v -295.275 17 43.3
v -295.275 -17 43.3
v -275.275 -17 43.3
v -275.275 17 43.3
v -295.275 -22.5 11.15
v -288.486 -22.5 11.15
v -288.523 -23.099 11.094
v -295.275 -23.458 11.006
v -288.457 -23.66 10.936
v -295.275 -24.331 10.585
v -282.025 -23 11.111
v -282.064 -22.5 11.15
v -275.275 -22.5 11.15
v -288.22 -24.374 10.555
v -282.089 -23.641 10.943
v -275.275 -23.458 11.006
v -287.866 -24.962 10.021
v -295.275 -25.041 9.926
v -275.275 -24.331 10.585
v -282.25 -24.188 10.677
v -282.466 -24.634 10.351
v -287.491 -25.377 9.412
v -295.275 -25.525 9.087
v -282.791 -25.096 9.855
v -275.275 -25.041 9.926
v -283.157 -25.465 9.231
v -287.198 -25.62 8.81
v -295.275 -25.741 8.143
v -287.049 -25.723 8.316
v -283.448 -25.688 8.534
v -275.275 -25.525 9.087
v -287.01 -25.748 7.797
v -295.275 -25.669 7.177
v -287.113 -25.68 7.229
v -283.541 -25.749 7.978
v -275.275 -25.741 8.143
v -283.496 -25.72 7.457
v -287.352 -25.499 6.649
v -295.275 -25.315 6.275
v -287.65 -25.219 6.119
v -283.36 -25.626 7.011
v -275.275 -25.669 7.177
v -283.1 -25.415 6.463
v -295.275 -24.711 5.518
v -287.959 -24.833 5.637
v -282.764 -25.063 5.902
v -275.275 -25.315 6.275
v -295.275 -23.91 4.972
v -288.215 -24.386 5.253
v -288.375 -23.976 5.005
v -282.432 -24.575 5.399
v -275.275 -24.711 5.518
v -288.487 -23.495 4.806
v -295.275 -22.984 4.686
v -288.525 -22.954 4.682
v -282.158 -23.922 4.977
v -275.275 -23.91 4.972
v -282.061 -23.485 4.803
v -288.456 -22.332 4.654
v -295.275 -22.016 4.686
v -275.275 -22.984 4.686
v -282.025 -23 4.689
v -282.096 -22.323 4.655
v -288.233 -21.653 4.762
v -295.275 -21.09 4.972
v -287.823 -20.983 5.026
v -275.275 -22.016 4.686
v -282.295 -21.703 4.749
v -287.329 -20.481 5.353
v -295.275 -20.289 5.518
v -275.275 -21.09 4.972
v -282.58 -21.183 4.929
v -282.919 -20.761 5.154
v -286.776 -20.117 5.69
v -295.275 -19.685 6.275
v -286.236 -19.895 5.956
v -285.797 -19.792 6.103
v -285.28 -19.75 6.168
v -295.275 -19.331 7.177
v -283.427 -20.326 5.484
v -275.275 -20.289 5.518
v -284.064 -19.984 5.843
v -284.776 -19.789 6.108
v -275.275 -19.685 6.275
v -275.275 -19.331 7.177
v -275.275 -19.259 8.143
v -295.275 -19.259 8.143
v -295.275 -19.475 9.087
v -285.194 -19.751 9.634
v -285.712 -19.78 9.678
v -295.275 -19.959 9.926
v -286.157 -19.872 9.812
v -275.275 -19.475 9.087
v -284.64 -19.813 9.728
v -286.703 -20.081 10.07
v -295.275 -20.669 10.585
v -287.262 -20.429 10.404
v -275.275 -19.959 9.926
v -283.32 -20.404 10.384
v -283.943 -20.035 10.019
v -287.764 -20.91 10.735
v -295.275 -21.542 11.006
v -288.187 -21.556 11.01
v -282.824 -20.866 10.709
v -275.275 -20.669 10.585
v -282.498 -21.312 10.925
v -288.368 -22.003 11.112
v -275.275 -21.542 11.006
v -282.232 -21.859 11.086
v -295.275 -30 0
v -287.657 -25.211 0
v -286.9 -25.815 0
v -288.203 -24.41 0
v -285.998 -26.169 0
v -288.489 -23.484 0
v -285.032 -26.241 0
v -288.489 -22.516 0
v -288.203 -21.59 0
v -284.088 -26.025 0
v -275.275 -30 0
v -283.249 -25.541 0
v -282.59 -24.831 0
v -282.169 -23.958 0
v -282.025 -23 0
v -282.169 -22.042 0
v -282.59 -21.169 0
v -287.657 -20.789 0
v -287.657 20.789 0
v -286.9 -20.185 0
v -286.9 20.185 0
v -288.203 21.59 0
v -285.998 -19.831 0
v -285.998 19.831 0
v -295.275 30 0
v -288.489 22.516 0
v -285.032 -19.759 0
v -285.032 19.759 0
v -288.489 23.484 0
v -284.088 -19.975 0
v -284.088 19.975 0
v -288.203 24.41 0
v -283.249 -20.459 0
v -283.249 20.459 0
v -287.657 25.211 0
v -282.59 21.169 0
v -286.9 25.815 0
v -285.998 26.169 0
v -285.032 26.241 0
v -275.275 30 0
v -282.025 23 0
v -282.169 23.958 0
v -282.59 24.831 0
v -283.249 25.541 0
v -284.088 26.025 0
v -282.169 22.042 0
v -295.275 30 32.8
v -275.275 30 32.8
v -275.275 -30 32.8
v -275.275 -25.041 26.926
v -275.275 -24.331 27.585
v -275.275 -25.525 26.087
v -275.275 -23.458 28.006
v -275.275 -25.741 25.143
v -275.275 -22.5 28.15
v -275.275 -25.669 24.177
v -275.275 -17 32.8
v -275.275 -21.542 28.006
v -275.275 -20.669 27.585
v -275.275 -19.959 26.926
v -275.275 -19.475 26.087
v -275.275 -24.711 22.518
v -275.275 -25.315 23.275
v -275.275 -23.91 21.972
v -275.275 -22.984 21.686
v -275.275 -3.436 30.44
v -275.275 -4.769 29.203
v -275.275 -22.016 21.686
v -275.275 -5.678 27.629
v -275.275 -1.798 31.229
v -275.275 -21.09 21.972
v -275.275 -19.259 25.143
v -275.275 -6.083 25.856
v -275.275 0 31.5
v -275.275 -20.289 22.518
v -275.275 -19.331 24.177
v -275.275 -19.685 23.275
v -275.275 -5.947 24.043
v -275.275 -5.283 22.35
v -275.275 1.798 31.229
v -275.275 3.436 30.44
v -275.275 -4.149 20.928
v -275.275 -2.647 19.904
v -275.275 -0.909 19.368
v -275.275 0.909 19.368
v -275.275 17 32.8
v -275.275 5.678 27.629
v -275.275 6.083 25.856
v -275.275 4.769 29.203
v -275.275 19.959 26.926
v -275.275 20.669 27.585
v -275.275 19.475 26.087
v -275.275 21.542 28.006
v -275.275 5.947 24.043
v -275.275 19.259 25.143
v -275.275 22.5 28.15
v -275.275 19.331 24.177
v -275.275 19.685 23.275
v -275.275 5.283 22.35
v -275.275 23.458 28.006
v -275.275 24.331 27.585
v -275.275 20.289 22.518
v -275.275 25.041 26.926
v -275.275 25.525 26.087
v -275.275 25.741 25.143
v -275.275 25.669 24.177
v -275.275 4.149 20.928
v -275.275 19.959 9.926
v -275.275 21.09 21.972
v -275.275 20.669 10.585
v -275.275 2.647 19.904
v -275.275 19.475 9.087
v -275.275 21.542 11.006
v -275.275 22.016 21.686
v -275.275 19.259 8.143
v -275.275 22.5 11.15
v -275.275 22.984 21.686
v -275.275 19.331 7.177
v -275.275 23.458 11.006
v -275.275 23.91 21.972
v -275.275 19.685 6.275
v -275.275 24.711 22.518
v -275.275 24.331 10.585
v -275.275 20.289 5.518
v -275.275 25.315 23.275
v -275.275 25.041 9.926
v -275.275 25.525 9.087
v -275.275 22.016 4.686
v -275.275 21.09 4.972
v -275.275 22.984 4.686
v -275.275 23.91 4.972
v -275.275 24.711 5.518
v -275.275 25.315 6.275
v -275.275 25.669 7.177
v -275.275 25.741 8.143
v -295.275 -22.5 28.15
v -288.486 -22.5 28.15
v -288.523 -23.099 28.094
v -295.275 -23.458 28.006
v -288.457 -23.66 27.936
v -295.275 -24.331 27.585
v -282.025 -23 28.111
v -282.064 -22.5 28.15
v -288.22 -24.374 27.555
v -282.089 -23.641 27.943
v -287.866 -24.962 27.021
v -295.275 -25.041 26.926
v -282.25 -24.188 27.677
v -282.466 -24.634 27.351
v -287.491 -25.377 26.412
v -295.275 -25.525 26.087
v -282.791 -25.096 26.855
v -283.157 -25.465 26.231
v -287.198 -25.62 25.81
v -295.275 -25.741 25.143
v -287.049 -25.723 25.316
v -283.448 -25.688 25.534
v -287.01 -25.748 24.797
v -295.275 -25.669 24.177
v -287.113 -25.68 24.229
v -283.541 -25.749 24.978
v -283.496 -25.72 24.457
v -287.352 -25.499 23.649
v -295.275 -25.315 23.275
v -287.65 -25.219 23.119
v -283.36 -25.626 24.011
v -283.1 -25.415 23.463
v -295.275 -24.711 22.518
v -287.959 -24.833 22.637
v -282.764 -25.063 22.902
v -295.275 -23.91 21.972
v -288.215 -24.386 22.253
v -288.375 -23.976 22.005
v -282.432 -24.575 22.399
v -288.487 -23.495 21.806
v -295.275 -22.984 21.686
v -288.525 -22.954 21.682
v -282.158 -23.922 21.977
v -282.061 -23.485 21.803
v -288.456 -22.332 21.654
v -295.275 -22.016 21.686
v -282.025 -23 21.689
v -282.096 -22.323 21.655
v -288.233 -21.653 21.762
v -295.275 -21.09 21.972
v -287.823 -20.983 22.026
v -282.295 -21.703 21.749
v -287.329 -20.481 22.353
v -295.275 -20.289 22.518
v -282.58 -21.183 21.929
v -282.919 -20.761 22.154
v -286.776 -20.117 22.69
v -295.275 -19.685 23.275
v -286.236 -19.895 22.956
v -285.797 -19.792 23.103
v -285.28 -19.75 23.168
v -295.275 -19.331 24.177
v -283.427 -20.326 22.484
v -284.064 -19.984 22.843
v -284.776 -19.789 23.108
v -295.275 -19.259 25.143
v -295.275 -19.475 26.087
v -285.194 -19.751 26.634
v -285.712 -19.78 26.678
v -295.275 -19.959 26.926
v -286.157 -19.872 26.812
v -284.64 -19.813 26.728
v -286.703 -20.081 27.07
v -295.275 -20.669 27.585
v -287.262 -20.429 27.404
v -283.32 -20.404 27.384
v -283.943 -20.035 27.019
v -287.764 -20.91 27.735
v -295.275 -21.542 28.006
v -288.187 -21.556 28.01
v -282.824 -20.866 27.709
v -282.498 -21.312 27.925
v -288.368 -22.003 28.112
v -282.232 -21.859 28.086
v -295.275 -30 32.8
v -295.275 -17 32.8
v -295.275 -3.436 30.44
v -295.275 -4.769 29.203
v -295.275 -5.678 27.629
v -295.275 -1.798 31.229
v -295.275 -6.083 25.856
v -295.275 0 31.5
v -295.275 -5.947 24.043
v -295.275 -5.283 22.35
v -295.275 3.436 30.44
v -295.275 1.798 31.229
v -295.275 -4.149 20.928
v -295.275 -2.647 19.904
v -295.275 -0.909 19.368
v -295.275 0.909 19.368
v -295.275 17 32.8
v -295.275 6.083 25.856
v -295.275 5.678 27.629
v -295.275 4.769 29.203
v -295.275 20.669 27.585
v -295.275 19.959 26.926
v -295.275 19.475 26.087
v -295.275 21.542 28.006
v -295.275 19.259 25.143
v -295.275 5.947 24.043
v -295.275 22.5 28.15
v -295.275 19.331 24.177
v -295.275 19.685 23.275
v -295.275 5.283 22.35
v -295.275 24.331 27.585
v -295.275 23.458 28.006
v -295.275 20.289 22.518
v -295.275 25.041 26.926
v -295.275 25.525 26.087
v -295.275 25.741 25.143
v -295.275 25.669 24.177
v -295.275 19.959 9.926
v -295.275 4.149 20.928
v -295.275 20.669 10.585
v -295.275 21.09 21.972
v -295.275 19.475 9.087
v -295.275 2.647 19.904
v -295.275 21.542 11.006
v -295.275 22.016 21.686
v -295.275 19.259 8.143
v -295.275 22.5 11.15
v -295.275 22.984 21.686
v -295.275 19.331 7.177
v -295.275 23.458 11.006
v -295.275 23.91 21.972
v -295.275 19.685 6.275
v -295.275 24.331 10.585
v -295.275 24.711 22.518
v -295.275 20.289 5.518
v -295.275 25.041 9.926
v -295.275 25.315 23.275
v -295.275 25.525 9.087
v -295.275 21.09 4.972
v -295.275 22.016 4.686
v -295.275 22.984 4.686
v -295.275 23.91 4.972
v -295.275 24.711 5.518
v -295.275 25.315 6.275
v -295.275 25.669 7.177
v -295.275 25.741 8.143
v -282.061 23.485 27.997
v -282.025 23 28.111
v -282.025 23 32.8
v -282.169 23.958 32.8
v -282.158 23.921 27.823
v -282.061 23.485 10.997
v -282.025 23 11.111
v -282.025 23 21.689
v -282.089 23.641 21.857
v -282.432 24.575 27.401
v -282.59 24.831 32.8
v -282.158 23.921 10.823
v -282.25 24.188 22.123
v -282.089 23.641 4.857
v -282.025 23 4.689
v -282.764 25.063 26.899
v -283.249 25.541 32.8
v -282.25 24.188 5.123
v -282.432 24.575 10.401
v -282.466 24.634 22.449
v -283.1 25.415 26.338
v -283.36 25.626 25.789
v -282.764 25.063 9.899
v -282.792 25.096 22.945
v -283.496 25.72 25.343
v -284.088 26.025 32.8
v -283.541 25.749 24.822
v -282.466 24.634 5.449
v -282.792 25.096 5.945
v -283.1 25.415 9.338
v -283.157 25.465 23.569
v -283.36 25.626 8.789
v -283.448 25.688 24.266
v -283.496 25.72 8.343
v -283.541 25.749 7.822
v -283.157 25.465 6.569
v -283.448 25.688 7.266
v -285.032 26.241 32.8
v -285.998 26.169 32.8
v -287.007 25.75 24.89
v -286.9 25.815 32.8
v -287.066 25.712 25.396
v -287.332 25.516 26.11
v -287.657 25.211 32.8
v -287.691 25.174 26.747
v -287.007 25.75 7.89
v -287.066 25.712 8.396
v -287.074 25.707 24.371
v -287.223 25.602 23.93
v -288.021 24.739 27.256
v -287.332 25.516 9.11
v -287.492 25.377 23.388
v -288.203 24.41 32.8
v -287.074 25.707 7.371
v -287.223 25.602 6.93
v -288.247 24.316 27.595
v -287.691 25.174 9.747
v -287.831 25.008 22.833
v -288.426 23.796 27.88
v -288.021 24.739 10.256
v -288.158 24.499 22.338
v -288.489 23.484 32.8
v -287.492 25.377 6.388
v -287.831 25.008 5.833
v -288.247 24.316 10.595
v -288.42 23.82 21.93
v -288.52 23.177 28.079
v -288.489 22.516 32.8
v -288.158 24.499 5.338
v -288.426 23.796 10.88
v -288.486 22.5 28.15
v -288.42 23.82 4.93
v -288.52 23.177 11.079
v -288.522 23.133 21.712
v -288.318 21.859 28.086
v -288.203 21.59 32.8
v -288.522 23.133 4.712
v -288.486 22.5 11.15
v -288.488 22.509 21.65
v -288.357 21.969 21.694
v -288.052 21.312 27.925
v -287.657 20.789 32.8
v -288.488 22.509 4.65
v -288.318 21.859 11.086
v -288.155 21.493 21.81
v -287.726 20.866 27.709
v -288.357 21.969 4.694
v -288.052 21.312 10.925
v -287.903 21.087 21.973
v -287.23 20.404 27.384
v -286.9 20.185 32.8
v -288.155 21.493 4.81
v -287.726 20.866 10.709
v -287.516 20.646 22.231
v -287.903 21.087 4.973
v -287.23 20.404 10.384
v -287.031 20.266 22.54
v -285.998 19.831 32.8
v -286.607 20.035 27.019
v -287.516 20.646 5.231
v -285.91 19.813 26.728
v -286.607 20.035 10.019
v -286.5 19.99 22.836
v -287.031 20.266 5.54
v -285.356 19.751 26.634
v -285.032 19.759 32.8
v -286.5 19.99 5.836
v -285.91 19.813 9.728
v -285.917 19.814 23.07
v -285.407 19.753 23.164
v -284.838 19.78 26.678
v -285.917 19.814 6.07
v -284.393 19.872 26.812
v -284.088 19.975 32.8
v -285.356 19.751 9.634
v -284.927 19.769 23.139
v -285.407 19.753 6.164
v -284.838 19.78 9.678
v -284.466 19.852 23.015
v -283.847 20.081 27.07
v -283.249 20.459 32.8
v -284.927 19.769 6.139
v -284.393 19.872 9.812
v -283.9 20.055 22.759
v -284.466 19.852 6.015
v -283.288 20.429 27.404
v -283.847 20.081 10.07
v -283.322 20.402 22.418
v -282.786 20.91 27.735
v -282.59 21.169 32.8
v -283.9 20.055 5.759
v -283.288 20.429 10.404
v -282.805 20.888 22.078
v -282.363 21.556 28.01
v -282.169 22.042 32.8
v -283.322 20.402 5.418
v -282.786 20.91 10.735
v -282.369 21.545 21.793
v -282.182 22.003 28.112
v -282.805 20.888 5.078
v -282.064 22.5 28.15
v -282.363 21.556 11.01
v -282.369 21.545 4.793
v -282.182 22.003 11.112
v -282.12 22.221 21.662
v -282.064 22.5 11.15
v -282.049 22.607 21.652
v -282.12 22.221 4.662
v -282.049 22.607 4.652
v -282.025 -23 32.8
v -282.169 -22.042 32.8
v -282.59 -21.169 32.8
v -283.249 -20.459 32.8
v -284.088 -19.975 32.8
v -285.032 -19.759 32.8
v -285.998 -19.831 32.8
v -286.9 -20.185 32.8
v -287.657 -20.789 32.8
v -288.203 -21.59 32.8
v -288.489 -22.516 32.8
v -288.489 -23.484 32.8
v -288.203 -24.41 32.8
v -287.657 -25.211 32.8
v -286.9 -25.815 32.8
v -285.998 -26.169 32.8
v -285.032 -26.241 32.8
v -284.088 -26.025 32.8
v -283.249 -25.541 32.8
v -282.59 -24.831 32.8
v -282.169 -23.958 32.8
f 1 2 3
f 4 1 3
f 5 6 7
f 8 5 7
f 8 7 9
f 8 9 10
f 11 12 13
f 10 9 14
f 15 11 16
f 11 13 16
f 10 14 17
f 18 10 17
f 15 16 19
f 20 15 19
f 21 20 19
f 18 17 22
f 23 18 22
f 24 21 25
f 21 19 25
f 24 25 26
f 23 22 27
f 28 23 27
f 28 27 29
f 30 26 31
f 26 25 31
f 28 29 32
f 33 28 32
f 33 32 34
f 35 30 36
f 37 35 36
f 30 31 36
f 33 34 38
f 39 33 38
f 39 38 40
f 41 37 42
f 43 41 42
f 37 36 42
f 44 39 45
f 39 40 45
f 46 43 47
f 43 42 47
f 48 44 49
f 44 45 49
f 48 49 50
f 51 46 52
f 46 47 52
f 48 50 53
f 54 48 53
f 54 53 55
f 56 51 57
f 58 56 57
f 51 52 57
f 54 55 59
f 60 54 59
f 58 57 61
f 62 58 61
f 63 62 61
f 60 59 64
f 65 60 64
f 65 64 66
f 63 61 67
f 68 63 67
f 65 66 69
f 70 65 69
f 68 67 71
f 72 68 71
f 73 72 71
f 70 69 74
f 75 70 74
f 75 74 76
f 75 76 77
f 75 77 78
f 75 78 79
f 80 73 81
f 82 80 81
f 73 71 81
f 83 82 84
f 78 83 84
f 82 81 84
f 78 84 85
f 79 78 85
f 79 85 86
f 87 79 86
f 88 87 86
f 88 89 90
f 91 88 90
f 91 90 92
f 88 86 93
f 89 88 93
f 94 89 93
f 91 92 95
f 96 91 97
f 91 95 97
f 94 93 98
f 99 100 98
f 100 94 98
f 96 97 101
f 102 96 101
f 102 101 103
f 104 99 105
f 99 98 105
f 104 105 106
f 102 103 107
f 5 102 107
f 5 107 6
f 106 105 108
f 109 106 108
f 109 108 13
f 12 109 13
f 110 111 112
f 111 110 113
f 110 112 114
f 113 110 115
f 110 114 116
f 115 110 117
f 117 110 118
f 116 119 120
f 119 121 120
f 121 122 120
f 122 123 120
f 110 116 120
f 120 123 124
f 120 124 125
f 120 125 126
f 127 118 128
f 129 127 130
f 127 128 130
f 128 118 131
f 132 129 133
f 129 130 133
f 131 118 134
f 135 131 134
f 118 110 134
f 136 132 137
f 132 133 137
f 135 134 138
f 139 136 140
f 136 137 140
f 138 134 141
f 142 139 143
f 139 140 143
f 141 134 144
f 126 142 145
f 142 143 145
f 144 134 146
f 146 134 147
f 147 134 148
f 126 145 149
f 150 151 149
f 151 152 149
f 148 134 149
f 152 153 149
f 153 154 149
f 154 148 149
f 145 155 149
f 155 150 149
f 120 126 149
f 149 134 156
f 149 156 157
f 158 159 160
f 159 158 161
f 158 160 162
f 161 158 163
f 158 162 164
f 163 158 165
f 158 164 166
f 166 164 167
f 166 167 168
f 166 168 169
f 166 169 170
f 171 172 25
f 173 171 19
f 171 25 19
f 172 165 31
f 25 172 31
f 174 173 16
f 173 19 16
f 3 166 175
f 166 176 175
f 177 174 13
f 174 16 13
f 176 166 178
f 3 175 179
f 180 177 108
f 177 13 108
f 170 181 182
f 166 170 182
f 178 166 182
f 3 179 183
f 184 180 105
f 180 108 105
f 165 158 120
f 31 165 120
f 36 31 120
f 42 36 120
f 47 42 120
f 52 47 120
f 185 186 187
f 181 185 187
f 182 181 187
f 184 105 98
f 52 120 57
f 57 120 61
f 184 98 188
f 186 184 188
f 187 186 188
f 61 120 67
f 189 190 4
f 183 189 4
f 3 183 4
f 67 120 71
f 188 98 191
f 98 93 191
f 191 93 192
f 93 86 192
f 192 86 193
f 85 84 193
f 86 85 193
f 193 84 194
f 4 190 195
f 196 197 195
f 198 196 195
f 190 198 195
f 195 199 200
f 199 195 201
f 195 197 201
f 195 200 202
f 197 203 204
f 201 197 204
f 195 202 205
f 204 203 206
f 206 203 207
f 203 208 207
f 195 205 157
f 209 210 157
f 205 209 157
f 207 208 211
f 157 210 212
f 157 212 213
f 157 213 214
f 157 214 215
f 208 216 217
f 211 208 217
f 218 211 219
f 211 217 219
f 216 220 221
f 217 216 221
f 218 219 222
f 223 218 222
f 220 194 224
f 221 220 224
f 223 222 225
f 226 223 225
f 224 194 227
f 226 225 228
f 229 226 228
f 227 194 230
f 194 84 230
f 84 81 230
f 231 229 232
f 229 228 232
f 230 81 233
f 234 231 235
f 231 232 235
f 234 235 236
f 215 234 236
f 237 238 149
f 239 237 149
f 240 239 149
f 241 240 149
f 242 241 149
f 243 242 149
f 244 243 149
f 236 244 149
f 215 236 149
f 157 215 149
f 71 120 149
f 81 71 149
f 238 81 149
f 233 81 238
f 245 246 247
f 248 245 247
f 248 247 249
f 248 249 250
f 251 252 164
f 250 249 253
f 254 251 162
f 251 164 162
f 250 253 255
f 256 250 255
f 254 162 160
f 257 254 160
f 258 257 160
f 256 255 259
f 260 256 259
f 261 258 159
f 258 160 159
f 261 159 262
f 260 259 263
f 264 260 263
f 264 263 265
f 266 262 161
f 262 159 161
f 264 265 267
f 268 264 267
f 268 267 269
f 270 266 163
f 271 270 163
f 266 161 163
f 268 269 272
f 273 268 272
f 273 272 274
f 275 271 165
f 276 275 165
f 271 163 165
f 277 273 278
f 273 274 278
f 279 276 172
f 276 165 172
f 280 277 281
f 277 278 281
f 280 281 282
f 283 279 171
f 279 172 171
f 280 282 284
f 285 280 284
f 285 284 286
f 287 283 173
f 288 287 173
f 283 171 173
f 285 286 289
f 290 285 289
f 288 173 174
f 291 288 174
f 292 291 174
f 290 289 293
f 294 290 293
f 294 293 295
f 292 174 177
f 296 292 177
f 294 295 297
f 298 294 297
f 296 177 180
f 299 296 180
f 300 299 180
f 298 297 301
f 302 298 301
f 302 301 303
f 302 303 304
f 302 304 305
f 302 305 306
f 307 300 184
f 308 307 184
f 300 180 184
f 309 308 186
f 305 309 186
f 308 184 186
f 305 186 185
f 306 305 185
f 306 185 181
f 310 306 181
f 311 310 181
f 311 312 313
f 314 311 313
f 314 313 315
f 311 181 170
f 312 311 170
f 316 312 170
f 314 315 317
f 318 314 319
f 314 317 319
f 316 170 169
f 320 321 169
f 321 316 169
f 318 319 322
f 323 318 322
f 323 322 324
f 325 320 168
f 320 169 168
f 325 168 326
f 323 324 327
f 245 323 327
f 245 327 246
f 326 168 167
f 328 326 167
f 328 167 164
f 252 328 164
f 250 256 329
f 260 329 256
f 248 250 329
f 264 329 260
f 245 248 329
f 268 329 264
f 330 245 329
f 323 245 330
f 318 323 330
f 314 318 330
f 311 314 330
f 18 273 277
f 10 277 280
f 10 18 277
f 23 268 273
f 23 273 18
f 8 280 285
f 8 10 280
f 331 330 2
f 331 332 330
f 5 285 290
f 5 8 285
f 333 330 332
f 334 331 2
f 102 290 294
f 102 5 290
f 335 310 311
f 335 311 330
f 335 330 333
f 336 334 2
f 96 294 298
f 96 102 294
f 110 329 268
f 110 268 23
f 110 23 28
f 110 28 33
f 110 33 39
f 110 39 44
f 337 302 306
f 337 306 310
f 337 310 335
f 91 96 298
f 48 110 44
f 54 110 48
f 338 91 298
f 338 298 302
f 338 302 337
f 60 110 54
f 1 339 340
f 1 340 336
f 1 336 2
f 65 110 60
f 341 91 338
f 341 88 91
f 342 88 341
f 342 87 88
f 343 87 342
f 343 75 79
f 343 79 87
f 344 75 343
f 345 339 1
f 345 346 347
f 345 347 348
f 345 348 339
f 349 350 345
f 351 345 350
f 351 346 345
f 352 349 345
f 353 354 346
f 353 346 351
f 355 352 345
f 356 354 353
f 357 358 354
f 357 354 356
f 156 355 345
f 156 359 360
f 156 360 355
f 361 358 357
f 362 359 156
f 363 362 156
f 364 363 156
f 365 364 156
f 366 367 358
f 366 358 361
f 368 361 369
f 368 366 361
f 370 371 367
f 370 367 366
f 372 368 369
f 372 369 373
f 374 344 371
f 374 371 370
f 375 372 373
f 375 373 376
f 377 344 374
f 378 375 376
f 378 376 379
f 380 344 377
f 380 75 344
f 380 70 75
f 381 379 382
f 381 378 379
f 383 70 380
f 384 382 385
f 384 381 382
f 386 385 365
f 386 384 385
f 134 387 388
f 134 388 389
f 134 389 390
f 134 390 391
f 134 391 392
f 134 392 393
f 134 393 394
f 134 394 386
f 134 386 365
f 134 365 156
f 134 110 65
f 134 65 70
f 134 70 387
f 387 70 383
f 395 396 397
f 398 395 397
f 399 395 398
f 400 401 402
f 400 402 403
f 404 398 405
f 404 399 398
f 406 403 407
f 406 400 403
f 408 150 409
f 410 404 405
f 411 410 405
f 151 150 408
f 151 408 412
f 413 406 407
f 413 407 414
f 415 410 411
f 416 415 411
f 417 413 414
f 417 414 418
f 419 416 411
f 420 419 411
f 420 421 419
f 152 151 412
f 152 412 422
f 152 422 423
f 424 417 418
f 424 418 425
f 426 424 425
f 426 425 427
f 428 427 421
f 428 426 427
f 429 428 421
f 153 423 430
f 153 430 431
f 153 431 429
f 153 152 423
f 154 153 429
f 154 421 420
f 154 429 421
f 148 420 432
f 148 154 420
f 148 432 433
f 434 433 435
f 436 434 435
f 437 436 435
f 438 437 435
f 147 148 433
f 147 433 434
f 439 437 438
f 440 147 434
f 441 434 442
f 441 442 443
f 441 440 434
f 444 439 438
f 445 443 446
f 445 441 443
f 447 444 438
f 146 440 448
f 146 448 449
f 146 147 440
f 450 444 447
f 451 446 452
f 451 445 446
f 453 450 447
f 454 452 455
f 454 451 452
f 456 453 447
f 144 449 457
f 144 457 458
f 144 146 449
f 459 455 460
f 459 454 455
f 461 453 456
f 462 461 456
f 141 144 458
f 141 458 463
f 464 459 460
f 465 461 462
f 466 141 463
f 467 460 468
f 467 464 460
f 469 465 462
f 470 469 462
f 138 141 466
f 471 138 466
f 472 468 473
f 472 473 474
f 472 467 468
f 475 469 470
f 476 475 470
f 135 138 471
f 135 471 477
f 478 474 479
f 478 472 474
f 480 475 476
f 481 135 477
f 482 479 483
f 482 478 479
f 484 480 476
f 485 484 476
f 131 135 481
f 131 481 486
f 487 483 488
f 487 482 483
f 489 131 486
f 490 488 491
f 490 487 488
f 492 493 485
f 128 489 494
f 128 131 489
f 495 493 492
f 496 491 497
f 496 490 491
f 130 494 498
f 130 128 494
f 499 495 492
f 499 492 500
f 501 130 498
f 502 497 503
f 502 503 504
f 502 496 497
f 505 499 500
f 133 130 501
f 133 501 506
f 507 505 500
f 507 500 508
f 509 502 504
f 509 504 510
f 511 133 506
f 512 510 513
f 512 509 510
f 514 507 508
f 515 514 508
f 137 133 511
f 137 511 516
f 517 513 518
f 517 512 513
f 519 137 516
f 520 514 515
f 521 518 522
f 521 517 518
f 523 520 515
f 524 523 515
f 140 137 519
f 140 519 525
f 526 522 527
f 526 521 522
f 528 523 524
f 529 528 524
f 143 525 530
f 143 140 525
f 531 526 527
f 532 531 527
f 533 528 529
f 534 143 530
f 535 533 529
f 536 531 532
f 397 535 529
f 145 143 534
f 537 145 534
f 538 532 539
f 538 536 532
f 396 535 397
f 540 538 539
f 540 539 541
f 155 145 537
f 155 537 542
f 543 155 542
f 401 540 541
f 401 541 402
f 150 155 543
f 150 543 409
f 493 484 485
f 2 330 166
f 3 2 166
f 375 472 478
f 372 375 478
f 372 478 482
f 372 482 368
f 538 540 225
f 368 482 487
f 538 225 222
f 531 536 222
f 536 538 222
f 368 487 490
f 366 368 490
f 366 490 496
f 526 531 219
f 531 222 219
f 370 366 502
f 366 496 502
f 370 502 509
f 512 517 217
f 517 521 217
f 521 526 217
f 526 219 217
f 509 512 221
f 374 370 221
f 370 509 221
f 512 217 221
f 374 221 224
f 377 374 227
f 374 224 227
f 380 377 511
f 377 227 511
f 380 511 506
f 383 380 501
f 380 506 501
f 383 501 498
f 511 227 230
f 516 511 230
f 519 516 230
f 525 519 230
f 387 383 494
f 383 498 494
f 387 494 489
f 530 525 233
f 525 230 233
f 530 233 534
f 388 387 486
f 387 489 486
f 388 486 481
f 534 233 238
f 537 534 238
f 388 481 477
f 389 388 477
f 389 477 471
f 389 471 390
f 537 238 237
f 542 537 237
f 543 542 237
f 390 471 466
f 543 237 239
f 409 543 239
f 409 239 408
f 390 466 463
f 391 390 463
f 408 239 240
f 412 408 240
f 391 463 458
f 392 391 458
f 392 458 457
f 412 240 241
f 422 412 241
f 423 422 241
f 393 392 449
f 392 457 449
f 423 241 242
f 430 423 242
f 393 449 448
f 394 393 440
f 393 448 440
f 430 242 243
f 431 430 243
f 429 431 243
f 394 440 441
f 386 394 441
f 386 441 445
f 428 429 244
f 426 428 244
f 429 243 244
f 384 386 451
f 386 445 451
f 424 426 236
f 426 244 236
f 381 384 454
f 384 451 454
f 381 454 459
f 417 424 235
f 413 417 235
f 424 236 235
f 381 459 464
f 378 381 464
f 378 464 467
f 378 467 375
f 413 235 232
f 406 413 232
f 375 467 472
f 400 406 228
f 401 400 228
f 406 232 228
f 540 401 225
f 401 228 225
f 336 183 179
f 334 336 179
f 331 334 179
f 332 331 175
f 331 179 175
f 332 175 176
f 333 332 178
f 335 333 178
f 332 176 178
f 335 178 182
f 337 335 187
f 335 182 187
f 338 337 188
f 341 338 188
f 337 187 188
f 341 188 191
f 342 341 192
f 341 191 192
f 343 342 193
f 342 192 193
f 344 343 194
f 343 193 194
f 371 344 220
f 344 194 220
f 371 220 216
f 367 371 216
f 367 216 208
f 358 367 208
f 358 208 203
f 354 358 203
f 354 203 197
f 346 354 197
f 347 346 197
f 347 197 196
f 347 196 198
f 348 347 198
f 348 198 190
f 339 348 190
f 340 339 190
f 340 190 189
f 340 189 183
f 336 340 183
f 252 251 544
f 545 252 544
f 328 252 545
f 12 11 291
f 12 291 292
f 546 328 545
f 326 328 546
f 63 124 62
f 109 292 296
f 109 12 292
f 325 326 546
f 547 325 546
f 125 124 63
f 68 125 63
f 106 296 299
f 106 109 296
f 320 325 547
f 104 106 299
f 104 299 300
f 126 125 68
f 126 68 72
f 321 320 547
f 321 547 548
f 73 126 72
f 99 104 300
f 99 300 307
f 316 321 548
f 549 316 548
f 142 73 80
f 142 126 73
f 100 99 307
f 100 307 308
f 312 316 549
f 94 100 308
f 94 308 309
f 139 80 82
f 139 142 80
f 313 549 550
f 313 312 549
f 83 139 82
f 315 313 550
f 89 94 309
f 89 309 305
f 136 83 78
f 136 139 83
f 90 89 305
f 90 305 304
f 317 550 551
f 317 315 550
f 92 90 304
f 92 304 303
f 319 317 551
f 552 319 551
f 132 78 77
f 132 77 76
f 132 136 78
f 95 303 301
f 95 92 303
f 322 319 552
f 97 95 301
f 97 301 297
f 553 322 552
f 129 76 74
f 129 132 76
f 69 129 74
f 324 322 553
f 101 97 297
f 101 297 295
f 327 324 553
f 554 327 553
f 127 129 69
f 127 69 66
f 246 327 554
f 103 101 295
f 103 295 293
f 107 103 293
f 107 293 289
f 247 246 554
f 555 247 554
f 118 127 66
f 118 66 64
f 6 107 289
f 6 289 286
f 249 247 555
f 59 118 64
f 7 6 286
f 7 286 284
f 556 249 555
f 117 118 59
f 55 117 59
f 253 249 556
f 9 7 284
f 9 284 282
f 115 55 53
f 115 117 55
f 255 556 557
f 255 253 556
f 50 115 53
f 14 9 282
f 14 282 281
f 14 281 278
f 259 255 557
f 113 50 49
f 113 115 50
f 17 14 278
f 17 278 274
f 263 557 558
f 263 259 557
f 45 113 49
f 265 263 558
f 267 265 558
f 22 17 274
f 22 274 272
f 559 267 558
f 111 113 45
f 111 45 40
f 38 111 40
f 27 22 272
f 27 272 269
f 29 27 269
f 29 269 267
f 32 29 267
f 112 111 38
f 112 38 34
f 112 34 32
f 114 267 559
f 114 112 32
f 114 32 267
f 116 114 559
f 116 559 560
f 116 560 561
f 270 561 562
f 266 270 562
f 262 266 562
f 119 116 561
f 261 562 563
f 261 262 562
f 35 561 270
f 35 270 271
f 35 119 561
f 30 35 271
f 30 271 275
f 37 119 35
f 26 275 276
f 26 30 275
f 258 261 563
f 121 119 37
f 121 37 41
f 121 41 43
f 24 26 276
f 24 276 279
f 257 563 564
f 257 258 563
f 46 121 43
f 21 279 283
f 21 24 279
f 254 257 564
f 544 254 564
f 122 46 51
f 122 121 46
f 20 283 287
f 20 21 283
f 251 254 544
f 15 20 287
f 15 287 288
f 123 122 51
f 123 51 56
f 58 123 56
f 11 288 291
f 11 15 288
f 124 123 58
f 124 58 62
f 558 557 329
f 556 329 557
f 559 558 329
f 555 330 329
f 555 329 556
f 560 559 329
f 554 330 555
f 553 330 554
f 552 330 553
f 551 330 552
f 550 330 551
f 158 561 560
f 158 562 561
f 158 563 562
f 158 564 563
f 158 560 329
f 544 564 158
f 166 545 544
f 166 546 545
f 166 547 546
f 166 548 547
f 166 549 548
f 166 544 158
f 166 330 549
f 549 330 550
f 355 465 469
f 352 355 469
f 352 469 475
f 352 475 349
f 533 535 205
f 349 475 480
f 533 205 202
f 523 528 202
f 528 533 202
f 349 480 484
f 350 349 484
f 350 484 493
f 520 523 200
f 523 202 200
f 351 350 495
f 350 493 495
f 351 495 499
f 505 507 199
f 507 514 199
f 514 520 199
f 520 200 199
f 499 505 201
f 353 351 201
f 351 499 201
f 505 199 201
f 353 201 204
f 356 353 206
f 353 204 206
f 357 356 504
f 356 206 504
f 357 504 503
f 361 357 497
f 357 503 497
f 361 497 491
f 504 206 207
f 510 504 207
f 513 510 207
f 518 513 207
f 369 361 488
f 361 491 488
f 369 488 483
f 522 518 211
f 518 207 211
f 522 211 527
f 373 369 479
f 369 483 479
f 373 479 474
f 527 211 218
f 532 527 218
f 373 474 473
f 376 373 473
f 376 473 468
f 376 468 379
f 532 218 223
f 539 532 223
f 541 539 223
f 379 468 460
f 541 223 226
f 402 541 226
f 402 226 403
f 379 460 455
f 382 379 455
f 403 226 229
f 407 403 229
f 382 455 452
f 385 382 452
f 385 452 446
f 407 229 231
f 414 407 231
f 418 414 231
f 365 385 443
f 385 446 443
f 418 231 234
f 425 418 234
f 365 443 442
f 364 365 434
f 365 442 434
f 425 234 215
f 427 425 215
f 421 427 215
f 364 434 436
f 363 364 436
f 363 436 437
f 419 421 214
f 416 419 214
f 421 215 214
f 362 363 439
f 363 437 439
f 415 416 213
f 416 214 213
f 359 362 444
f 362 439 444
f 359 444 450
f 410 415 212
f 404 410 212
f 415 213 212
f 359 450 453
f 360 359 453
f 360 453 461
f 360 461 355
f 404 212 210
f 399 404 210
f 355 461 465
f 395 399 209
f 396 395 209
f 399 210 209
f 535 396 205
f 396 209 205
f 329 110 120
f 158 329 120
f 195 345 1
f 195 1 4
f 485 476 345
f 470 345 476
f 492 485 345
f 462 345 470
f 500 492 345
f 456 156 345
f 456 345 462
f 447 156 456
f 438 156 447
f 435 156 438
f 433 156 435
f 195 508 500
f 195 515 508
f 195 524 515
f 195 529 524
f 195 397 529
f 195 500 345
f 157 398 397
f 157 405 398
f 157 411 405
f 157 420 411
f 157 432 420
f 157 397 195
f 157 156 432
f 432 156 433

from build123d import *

# Parameters (mm, degrees)
SKETCH1_W           = 20
SKETCH1_H           = 13
SKETCH1_R           = 3.25
SKETCH1_H_2         = 34
BOSS_EXTRUDE1_DEPTH = 32.8
BOSS_EXTRUDE2_START = 32.8
SKETCH1_3_W         = 20
SKETCH1_3_H         = 34
BOSS_EXTRUDE2_DEPTH = 10.5
SKETCH2_OUTSIDE_W   = 60.63
SKETCH2_OUTSIDE_H   = 77.33
SKETCH2_OUTSIDE_R   = 6.1
SKETCH2_OUTSIDE_R_2 = 3.25
CUT_EXTRUDE1_DEPTH  = 295.275


with BuildPart() as part:
    # Sketch1 → Boss-Extrude1 (new body)
    # profile 1 of 3: a face of its own
    with BuildSketch(Plane.XY):
        with Locations((-285.275, 23.5)):
            Rectangle(SKETCH1_W, SKETCH1_H)
        with Locations((-285.275, 23)):
            Circle(SKETCH1_R, mode=Mode.SUBTRACT)
    # profile 2 of 3: a face of its own
    with BuildSketch(Plane.XY):
        with Locations((-285.275, 0)):
            Rectangle(SKETCH1_W, SKETCH1_H_2)
    # profile 3 of 3: a face of its own
    with BuildSketch(Plane.XY):
        with Locations((-285.275, -23.5)):
            Rectangle(SKETCH1_W, SKETCH1_H)
        with Locations((-285.275, -23)):
            Circle(SKETCH1_R, mode=Mode.SUBTRACT)
    extrude(amount=BOSS_EXTRUDE1_DEPTH)

    # Sketch1<3> → Boss-Extrude2 (add)
    with BuildSketch(Plane.XY.offset(BOSS_EXTRUDE2_START)):
        with Locations((-285.275, 0)):
            Rectangle(SKETCH1_3_W, SKETCH1_3_H)
    extrude(amount=BOSS_EXTRUDE2_DEPTH)

    # Sketch2 outside → Cut-Extrude1 (cut)
    # profile 1 of 6: a face of its own
    with BuildSketch(Plane(origin=(0, 0, 0), x_dir=(0, 0, -1), z_dir=(1, 0, 0))):
        with Locations((-21.65, 0)):
            Rectangle(SKETCH2_OUTSIDE_W, SKETCH2_OUTSIDE_H)
        Polygon((0, -30), (0, 30), (-32.8, 30), (-32.8, 17), (-43.3, 17), (-43.3, -17), (-32.8, -17), (-32.8, -30), align=None, mode=Mode.SUBTRACT)
    # profile 2 of 6: a face of its own
    with BuildSketch(Plane(origin=(0, 0, 0), x_dir=(0, 0, -1), z_dir=(1, 0, 0))):
        with Locations(Location((-25.4, 0, 0), (0, 0, 180))):
            Circle(SKETCH2_OUTSIDE_R)
    # profile 3 of 6: a face of its own
    with BuildSketch(Plane(origin=(0, 0, 0), x_dir=(0, 0, -1), z_dir=(1, 0, 0))):
        with Locations(Location((-7.9, -22.5, 0), (0, 0, 180))):
            Circle(SKETCH2_OUTSIDE_R_2)
    # profile 4 of 6: a face of its own
    with BuildSketch(Plane(origin=(0, 0, 0), x_dir=(0, 0, -1), z_dir=(1, 0, 0))):
        with Locations(Location((-24.9, -22.5, 0), (0, 0, 180))):
            Circle(SKETCH2_OUTSIDE_R_2)
    # profile 5 of 6: a face of its own
    with BuildSketch(Plane(origin=(0, 0, 0), x_dir=(0, 0, -1), z_dir=(1, 0, 0))):
        with Locations(Location((-24.9, 22.5, 0), (0, 0, 180))):
            Circle(SKETCH2_OUTSIDE_R_2)
    # profile 6 of 6: a face of its own
    with BuildSketch(Plane(origin=(0, 0, 0), x_dir=(0, 0, -1), z_dir=(1, 0, 0))):
        with Locations(Location((-7.9, 22.5, 0), (0, 0, 180))):
            Circle(SKETCH2_OUTSIDE_R_2)
    extrude(amount=-CUT_EXTRUDE1_DEPTH, mode=Mode.SUBTRACT)


solid = part.part
